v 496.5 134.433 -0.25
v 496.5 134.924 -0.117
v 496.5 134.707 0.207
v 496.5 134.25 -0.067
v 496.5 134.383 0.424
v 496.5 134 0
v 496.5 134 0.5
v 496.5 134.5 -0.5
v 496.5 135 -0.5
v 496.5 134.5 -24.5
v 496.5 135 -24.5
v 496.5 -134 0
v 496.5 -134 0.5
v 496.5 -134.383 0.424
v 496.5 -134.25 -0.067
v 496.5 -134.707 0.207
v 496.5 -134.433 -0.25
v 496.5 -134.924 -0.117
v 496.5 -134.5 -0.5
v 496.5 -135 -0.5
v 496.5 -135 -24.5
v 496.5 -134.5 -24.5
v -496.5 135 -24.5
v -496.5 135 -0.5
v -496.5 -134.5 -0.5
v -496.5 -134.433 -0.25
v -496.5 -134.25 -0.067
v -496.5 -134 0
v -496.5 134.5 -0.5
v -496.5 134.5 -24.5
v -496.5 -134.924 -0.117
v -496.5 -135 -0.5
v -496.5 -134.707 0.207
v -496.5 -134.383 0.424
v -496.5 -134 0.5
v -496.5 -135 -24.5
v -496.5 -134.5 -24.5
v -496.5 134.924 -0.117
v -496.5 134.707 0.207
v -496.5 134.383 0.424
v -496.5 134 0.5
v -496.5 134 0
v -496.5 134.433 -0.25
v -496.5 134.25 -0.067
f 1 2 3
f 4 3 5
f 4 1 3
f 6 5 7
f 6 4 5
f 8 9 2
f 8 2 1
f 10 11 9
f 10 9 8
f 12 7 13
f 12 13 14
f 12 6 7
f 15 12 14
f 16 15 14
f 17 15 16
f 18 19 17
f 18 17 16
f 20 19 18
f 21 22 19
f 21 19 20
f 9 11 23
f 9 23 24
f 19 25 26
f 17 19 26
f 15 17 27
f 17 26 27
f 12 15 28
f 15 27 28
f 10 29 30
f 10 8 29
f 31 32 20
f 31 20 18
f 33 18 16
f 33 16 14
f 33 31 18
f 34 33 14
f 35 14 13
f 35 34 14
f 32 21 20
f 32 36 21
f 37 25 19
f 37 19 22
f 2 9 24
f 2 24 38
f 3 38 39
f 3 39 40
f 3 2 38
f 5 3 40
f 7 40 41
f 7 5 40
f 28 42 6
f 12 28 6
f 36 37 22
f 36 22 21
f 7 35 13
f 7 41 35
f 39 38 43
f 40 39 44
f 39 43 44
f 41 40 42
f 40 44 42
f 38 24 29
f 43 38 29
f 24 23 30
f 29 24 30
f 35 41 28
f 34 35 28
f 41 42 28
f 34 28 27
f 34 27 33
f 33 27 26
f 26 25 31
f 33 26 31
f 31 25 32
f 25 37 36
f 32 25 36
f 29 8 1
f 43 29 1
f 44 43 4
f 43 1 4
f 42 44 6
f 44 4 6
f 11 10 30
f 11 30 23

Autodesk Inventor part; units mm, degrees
ref_plane "YZ Plane" through (0, 0, 0) normal (1, 0, 0) x (0, 1, 0)
ref_plane "XZ Plane" through (0, 0, 0) normal (0, 1, 0) x (-1, 0, 0)
ref_plane "XY Plane" through (0, 0, 0) normal (0, 0, 1) x (1, 0, 0)
sketch "Sketch1" plane through (0, 0, 0) normal (0, 0, 1) x (1, 0, 0)
  line L0 (-496.5, -135) -> (496.5, -135)
  line L1 (496.5, -135) -> (496.5, 135)
  line L2 (496.5, 135) -> (-496.5, 135)
  line L3 (-496.5, 135) -> (-496.5, -135)
  line L4 (-496.5, -135) -> (496.5, 135) construction
  line L5 (496.5, -135) -> (-496.5, 135) construction
  point P0 (0, 0)
  dimension "d0" = 993
  dimension "d1" = 270
extrude "Plate1" add sketch "Sketch1" along normal blind 0.5
sketch "Sketch2" plane through (496.5, 134.5, 0.5) normal (0, 1, 0) x (-1, 0, 0)
  line L0 (993, 0) -> (0, 0)
  line L1 (0, 0) -> (0, -25)
  line L2 (0, -25) -> (993, -25)
  line L3 (993, -25) -> (993, 0)
edge flange "Flange1" height 25 angle 90 thickness 0.5 bend radius 0.5 thickness toward (0, 1, 0) relief tear relief width 0.5 relief depth 0.25 corner gap 0.5 corner form 0 edges at (0, 135, 0) (0, -135, 0) wall of the first edge with corners at (-496.5, 134.5, 0.5) (496.5, 134.5, 0.5) (496.5, 134.5, -24.5) (-496.5, 134.5, -24.5)
bend "Bend1"
corner "Corner1"
equation "\"d2\" = Thickness"
equation "\"d3\" = BendReliefWidth"
equation "\"d4\" = BendReliefDepth"
equation "\"d5\" = MinimumRemnant"
equation "\"d6\" = TransitionRadius"
equation "\"d9\" = BendRadius"
equation "\"d10\" = CornerReliefSize"
equation "\"d11\" = GapSize"
equation "\"d12\" = JacobiRadiusSize"
equation "\"BendRadius\" = Thickness"
equation "\"BendReliefWidth\" = Thickness"
equation "\"BendReliefDepth\" = 0.5 * Thickness"
equation "\"CornerReliefSize\" = 4 * Thickness"
equation "\"MinimumRemnant\" = 2 * Thickness"
equation "\"TransitionRadius\" = BendRadius"
equation "\"JacobiRadiusSize\" = BendRadius"
equation "\"GapSize\" = Thickness"
equation "\"Space5\" = 0"
equation "\"Space6\" = 0"
equation "\"Space7\" = 0"
equation "\"Thickness\" = 0.5"
properties part number "Acoplador_de_Cuentas"
